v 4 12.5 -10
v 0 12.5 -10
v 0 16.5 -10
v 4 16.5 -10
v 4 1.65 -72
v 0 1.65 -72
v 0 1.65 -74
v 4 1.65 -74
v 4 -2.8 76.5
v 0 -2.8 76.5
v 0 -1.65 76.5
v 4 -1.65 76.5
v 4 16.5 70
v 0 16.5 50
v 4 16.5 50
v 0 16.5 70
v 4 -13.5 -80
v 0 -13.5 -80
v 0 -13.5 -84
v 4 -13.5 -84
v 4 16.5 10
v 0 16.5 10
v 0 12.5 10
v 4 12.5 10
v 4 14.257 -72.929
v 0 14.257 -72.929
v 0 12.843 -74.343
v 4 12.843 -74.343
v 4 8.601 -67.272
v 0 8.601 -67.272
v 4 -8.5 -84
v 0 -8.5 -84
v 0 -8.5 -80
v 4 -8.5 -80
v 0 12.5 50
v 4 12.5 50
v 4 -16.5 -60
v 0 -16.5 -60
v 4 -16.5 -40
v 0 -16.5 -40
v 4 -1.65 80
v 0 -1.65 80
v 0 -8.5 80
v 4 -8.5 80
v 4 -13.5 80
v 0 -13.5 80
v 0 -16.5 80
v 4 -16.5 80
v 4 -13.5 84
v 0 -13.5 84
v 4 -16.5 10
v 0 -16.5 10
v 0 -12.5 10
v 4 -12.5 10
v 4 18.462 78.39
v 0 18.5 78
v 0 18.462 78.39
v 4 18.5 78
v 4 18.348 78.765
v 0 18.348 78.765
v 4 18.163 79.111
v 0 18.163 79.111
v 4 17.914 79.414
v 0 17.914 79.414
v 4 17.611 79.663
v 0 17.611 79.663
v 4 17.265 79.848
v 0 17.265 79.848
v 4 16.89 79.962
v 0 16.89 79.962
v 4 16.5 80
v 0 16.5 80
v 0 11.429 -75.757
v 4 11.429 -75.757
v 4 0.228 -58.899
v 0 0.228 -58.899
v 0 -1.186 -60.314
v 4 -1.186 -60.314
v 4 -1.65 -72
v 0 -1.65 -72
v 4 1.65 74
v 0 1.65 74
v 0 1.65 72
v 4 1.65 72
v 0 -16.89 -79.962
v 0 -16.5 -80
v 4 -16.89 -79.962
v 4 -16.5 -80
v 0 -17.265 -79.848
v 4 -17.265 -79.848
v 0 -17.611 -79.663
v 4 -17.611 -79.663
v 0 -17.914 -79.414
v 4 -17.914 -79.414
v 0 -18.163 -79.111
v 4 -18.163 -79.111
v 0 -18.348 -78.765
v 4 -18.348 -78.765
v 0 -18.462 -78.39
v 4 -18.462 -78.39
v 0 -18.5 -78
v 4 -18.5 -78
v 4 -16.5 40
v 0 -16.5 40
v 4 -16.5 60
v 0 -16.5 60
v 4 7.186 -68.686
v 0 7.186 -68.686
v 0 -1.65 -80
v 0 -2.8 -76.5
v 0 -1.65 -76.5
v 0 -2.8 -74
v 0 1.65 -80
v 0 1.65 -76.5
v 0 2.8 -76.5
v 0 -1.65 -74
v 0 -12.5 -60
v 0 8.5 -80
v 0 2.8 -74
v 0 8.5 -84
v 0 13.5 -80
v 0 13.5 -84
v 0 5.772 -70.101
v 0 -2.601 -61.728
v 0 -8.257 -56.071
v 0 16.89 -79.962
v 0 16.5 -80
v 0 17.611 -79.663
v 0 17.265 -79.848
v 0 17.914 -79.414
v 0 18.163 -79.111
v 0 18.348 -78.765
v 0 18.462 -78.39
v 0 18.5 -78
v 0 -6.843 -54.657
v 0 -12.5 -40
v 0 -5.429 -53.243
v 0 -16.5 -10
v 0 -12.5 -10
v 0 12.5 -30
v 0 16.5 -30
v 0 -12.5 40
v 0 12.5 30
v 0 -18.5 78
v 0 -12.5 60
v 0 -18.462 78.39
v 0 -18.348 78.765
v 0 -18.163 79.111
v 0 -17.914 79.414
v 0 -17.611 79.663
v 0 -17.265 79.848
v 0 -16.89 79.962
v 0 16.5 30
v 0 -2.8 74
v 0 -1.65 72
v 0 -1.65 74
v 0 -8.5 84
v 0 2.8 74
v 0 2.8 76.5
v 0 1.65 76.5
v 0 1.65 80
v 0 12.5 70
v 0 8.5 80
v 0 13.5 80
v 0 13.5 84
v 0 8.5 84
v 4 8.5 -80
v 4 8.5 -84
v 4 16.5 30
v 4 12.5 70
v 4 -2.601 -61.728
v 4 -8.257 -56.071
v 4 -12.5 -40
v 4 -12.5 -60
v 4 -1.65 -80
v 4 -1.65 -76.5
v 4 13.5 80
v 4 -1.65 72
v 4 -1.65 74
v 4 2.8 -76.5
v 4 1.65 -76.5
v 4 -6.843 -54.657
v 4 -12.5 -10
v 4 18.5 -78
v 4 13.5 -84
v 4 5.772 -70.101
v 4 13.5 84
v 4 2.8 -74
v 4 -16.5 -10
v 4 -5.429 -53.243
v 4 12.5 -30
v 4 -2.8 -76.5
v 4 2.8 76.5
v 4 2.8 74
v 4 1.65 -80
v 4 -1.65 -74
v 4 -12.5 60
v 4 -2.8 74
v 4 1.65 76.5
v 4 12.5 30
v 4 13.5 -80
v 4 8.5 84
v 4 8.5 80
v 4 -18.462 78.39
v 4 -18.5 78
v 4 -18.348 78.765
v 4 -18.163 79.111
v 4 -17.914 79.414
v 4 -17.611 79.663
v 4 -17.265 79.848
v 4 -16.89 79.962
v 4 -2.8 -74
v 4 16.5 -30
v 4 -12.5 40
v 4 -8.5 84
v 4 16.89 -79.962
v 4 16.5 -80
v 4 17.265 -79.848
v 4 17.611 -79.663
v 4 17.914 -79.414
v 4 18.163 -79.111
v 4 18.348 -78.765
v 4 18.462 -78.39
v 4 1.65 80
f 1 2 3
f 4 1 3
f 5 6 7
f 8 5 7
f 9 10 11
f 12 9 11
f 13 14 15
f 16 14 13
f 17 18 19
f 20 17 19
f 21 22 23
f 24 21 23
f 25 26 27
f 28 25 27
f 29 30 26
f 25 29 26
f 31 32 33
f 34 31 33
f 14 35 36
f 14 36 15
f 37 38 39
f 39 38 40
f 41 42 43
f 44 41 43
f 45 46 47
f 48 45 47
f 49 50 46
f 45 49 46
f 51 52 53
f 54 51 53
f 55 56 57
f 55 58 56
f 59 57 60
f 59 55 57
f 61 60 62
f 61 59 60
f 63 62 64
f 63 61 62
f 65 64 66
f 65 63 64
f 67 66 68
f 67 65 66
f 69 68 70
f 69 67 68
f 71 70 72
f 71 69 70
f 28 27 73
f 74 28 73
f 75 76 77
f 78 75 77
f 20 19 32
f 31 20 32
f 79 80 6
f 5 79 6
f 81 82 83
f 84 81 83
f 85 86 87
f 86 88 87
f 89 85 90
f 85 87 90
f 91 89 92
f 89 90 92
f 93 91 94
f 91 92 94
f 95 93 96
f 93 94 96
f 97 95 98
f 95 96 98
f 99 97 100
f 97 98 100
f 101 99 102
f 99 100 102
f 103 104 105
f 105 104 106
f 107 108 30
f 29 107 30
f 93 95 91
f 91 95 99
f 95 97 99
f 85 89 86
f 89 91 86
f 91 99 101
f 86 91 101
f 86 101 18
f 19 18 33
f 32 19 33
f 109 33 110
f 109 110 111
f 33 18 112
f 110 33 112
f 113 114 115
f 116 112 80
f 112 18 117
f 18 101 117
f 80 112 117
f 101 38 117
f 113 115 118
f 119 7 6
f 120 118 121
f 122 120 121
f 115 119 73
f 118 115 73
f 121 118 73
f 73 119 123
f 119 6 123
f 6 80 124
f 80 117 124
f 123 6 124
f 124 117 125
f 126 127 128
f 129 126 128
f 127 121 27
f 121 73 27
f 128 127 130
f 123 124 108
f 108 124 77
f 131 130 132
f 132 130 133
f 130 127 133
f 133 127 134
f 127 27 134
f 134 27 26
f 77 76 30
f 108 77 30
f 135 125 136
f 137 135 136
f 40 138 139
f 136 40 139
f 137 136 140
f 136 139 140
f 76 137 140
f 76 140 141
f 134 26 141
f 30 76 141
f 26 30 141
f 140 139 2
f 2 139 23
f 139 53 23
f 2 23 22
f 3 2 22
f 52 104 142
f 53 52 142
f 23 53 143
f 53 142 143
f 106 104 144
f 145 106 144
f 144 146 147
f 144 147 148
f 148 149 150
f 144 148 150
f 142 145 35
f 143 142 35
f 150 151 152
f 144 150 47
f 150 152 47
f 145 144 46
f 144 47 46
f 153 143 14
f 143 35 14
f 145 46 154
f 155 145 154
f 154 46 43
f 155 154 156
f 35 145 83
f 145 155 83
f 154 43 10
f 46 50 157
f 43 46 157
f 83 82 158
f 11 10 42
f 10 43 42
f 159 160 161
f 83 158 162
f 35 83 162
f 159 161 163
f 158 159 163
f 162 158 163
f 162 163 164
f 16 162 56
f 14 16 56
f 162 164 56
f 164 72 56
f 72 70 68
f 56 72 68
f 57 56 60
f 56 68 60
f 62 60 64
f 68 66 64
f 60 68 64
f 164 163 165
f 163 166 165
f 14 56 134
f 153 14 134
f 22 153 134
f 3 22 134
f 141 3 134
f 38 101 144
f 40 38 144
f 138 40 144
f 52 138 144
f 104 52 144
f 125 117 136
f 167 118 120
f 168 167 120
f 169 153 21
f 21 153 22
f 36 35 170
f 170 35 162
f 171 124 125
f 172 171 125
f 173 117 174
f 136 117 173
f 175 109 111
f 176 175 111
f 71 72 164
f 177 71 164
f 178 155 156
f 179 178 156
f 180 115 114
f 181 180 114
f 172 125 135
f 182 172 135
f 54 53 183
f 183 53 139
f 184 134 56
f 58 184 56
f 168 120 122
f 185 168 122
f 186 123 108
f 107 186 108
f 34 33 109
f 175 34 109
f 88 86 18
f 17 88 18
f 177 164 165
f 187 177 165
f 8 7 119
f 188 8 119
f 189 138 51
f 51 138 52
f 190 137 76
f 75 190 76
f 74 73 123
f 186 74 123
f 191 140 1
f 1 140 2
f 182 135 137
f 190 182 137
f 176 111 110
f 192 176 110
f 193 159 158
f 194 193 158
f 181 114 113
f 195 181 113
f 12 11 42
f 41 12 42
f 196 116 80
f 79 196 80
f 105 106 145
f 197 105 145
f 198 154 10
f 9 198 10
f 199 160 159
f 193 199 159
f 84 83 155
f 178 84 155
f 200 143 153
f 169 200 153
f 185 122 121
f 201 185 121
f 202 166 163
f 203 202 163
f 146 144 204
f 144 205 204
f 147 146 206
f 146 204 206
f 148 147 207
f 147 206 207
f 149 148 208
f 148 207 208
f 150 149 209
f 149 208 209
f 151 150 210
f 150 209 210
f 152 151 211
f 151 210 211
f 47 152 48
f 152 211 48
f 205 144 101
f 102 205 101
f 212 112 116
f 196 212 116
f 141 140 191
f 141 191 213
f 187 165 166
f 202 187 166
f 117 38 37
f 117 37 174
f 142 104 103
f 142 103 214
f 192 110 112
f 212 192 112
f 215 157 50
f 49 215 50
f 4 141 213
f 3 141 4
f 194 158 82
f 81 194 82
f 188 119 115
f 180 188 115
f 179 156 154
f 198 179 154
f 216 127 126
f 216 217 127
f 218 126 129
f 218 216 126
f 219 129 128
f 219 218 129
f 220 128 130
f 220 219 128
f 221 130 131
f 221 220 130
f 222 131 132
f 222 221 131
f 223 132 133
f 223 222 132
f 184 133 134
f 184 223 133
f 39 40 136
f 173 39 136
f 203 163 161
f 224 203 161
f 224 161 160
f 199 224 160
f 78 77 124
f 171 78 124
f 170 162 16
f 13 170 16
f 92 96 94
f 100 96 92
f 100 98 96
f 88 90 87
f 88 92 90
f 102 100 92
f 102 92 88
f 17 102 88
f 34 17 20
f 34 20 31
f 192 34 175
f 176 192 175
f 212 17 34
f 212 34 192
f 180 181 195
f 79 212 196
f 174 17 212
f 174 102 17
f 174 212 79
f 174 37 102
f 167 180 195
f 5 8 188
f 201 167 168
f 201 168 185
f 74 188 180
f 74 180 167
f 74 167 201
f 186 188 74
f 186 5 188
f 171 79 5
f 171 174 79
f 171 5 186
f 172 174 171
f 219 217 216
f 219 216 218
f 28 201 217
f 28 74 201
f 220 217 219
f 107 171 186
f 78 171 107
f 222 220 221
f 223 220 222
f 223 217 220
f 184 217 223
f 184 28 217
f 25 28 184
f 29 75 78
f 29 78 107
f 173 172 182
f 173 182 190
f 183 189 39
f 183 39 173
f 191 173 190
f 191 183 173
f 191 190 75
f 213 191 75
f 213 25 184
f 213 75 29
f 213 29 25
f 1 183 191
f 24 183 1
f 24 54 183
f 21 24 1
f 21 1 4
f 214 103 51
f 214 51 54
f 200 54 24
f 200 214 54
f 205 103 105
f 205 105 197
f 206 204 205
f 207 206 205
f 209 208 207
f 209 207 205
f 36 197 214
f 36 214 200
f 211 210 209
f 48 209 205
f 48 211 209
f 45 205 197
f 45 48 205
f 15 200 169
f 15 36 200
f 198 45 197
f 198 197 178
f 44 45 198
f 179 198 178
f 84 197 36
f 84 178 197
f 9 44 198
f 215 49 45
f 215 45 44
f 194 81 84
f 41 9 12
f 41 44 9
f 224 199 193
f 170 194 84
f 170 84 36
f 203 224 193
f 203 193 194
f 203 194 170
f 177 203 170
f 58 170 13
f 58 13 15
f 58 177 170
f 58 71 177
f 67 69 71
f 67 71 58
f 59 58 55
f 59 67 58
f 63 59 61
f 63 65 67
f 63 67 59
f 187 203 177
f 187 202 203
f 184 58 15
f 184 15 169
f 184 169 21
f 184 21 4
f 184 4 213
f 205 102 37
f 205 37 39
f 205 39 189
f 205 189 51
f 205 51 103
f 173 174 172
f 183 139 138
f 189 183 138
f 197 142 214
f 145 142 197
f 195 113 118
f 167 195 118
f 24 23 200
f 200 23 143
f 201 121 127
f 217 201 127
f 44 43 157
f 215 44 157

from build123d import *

# Parameters (mm, degrees)
F0_W     = 4
F0_H     = 20
F1_DEPTH = 4
F2_R     = 2


with BuildPart() as f1:
    # F0 (on Right) → F1 (new body)
    with BuildSketch(Plane.YZ):
        Polygon((13.5, -80), (18.5, -80), (18.5, 80), (13.5, 80), (13.5, 84), (8.5, 84), (8.5, 80), (1.65, 80), (1.65, 76.5), (2.8, 76.5), (2.8, 74), (1.65, 74), (1.65, 72), (-1.65, 72), (-1.65, 74), (-2.8, 74), (-2.8, 76.5), (-1.65, 76.5), (-1.65, 80), (-8.5, 80), (-8.5, 84), (-13.5, 84), (-13.5, 80), (-18.5, 80), (-18.5, -80), (-13.5, -80), (-13.5, -84), (-8.5, -84), (-8.5, -80), (-1.65, -80), (-1.65, -76.5), (-2.8, -76.5), (-2.8, -74), (-1.65, -74), (-1.65, -72), (1.65, -72), (1.65, -74), (2.8, -74), (2.8, -76.5), (1.65, -76.5), (1.65, -80), (8.5, -80), (8.5, -84), (13.5, -84), align=None)
        with Locations((-14.5, -50)):
            Rectangle(F0_W, F0_H, mode=Mode.SUBTRACT)
        Polygon((-8.257359, -56.071068), (-6.843146, -54.656854), (-5.428932, -53.242641), (0.227922, -58.899495), (-1.186292, -60.313708), (-2.600505, -61.727922), align=None, mode=Mode.SUBTRACT)
        Polygon((14.257359, -72.928932), (12.843146, -74.343146), (11.428932, -75.757359), (5.772078, -70.100505), (7.186292, -68.686292), (8.600505, -67.272078), align=None, mode=Mode.SUBTRACT)
        with Locations((14.5, -20)):
            Rectangle(F0_W, F0_H, mode=Mode.SUBTRACT)
        Polygon((-16.5, -10), (-16.5, 0), (-16.5, 10), (-12.5, 10), (-12.5, 0), (-12.5, -10), align=None, mode=Mode.SUBTRACT)
        with Locations((-14.5, 50)):
            Rectangle(F0_W, F0_H, mode=Mode.SUBTRACT)
        Polygon((12.5, 10), (12.5, 20), (12.5, 30), (16.5, 30), (16.5, 20), (16.5, 10), align=None, mode=Mode.SUBTRACT)
        with Locations((14.5, 60)):
            Rectangle(F0_W, F0_H, mode=Mode.SUBTRACT)
    extrude(amount=F1_DEPTH)

    # F2
    f2_edges = [f1.edges().sort_by_distance(p)[0] for p in [
        (2, -18.5, -80),
        (2, 18.5, -80),
        (2, -18.5, 80),
        (2, 18.5, 80),
    ]]
    fillet(f2_edges, radius=F2_R)


solid = f1.part
